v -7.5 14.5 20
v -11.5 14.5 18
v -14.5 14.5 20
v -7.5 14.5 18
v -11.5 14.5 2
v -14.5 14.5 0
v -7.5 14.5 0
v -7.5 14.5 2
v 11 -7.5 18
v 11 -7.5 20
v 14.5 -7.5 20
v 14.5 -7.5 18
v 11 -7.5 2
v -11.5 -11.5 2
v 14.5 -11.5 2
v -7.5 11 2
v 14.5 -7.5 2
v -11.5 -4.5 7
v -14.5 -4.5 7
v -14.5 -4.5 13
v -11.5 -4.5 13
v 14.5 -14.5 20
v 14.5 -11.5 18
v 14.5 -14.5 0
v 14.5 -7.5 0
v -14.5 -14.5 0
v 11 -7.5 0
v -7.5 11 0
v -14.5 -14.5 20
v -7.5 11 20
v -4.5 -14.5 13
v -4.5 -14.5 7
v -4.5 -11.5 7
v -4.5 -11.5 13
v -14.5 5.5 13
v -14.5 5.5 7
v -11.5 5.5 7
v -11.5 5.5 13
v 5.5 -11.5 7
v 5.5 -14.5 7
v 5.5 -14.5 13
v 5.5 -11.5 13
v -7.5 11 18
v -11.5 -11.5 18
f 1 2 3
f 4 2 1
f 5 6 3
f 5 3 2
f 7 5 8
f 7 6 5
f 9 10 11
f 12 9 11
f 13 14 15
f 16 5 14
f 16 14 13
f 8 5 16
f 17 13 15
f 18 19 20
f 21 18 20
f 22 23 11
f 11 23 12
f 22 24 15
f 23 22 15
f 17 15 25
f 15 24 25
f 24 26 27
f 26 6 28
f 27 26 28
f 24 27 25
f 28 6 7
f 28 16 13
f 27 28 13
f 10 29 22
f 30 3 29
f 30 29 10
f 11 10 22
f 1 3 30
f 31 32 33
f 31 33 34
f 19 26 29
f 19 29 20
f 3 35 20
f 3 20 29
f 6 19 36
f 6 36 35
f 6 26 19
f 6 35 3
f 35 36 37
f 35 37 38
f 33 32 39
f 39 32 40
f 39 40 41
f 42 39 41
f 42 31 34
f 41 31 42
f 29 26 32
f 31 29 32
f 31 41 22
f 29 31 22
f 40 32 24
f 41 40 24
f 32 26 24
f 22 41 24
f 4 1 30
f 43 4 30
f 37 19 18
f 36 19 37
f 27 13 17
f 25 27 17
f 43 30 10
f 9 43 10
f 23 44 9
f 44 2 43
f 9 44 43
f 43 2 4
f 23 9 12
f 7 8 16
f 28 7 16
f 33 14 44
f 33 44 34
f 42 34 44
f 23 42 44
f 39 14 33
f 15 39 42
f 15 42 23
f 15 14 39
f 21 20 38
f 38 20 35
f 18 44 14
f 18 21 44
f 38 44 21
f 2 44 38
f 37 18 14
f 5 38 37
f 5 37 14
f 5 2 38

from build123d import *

# Parameters (mm, degrees)
SKETCH1_W           = 29
SKETCH1_H           = 29
BOSS_EXTRUDE1_DEPTH = 20
SKETCH2_W           = 26
SKETCH2_H           = 16
CUT_EXTRUDE1_DEPTH  = 26
CUT_EXTRUDE2_DEPTH  = 21
SKETCH4_W           = 10
SKETCH4_H           = 6
CUT_EXTRUDE3_DEPTH  = 30
SKETCH5_W           = 6
SKETCH5_H           = 10
CUT_EXTRUDE4_DEPTH  = 30


with BuildPart() as part:
    # Sketch1 → Boss-Extrude1 (new body)
    with BuildSketch(Plane.XY):
        Rectangle(SKETCH1_W, SKETCH1_H)
    extrude(amount=BOSS_EXTRUDE1_DEPTH)

    # Sketch2 → Cut-Extrude1 (cut)
    with BuildSketch(Plane(origin=(0, 14.5, 0), x_dir=(1, 0, 0), z_dir=(0, 1, 0))):
        with Locations((1.5, -10)):
            Rectangle(SKETCH2_W, SKETCH2_H)
    extrude(amount=-CUT_EXTRUDE1_DEPTH, mode=Mode.SUBTRACT)

    # Sketch3 → Cut-Extrude2 (cut, through all)
    with BuildSketch(Plane.XY.offset(20)):
        Polygon((-7.5, 14.5), (-7.5, 11), (11, -7.5), (14.5, -7.5), (14.5, 14.5), align=None)
    extrude(amount=-CUT_EXTRUDE2_DEPTH, mode=Mode.SUBTRACT)

    # Sketch4 → Cut-Extrude3 (cut, through all)
    with BuildSketch(Plane.XZ.offset(14.5)):
        with Locations((0.5, 10)):
            Rectangle(SKETCH4_W, SKETCH4_H)
    extrude(amount=-CUT_EXTRUDE3_DEPTH, mode=Mode.SUBTRACT)

    # Sketch5 → Cut-Extrude4 (cut, through all)
    with BuildSketch(Plane.ZY.offset(14.5)):
        with Locations((10, 0.5)):
            Rectangle(SKETCH5_W, SKETCH5_H)
    extrude(amount=-CUT_EXTRUDE4_DEPTH, mode=Mode.SUBTRACT)


solid = part.part
